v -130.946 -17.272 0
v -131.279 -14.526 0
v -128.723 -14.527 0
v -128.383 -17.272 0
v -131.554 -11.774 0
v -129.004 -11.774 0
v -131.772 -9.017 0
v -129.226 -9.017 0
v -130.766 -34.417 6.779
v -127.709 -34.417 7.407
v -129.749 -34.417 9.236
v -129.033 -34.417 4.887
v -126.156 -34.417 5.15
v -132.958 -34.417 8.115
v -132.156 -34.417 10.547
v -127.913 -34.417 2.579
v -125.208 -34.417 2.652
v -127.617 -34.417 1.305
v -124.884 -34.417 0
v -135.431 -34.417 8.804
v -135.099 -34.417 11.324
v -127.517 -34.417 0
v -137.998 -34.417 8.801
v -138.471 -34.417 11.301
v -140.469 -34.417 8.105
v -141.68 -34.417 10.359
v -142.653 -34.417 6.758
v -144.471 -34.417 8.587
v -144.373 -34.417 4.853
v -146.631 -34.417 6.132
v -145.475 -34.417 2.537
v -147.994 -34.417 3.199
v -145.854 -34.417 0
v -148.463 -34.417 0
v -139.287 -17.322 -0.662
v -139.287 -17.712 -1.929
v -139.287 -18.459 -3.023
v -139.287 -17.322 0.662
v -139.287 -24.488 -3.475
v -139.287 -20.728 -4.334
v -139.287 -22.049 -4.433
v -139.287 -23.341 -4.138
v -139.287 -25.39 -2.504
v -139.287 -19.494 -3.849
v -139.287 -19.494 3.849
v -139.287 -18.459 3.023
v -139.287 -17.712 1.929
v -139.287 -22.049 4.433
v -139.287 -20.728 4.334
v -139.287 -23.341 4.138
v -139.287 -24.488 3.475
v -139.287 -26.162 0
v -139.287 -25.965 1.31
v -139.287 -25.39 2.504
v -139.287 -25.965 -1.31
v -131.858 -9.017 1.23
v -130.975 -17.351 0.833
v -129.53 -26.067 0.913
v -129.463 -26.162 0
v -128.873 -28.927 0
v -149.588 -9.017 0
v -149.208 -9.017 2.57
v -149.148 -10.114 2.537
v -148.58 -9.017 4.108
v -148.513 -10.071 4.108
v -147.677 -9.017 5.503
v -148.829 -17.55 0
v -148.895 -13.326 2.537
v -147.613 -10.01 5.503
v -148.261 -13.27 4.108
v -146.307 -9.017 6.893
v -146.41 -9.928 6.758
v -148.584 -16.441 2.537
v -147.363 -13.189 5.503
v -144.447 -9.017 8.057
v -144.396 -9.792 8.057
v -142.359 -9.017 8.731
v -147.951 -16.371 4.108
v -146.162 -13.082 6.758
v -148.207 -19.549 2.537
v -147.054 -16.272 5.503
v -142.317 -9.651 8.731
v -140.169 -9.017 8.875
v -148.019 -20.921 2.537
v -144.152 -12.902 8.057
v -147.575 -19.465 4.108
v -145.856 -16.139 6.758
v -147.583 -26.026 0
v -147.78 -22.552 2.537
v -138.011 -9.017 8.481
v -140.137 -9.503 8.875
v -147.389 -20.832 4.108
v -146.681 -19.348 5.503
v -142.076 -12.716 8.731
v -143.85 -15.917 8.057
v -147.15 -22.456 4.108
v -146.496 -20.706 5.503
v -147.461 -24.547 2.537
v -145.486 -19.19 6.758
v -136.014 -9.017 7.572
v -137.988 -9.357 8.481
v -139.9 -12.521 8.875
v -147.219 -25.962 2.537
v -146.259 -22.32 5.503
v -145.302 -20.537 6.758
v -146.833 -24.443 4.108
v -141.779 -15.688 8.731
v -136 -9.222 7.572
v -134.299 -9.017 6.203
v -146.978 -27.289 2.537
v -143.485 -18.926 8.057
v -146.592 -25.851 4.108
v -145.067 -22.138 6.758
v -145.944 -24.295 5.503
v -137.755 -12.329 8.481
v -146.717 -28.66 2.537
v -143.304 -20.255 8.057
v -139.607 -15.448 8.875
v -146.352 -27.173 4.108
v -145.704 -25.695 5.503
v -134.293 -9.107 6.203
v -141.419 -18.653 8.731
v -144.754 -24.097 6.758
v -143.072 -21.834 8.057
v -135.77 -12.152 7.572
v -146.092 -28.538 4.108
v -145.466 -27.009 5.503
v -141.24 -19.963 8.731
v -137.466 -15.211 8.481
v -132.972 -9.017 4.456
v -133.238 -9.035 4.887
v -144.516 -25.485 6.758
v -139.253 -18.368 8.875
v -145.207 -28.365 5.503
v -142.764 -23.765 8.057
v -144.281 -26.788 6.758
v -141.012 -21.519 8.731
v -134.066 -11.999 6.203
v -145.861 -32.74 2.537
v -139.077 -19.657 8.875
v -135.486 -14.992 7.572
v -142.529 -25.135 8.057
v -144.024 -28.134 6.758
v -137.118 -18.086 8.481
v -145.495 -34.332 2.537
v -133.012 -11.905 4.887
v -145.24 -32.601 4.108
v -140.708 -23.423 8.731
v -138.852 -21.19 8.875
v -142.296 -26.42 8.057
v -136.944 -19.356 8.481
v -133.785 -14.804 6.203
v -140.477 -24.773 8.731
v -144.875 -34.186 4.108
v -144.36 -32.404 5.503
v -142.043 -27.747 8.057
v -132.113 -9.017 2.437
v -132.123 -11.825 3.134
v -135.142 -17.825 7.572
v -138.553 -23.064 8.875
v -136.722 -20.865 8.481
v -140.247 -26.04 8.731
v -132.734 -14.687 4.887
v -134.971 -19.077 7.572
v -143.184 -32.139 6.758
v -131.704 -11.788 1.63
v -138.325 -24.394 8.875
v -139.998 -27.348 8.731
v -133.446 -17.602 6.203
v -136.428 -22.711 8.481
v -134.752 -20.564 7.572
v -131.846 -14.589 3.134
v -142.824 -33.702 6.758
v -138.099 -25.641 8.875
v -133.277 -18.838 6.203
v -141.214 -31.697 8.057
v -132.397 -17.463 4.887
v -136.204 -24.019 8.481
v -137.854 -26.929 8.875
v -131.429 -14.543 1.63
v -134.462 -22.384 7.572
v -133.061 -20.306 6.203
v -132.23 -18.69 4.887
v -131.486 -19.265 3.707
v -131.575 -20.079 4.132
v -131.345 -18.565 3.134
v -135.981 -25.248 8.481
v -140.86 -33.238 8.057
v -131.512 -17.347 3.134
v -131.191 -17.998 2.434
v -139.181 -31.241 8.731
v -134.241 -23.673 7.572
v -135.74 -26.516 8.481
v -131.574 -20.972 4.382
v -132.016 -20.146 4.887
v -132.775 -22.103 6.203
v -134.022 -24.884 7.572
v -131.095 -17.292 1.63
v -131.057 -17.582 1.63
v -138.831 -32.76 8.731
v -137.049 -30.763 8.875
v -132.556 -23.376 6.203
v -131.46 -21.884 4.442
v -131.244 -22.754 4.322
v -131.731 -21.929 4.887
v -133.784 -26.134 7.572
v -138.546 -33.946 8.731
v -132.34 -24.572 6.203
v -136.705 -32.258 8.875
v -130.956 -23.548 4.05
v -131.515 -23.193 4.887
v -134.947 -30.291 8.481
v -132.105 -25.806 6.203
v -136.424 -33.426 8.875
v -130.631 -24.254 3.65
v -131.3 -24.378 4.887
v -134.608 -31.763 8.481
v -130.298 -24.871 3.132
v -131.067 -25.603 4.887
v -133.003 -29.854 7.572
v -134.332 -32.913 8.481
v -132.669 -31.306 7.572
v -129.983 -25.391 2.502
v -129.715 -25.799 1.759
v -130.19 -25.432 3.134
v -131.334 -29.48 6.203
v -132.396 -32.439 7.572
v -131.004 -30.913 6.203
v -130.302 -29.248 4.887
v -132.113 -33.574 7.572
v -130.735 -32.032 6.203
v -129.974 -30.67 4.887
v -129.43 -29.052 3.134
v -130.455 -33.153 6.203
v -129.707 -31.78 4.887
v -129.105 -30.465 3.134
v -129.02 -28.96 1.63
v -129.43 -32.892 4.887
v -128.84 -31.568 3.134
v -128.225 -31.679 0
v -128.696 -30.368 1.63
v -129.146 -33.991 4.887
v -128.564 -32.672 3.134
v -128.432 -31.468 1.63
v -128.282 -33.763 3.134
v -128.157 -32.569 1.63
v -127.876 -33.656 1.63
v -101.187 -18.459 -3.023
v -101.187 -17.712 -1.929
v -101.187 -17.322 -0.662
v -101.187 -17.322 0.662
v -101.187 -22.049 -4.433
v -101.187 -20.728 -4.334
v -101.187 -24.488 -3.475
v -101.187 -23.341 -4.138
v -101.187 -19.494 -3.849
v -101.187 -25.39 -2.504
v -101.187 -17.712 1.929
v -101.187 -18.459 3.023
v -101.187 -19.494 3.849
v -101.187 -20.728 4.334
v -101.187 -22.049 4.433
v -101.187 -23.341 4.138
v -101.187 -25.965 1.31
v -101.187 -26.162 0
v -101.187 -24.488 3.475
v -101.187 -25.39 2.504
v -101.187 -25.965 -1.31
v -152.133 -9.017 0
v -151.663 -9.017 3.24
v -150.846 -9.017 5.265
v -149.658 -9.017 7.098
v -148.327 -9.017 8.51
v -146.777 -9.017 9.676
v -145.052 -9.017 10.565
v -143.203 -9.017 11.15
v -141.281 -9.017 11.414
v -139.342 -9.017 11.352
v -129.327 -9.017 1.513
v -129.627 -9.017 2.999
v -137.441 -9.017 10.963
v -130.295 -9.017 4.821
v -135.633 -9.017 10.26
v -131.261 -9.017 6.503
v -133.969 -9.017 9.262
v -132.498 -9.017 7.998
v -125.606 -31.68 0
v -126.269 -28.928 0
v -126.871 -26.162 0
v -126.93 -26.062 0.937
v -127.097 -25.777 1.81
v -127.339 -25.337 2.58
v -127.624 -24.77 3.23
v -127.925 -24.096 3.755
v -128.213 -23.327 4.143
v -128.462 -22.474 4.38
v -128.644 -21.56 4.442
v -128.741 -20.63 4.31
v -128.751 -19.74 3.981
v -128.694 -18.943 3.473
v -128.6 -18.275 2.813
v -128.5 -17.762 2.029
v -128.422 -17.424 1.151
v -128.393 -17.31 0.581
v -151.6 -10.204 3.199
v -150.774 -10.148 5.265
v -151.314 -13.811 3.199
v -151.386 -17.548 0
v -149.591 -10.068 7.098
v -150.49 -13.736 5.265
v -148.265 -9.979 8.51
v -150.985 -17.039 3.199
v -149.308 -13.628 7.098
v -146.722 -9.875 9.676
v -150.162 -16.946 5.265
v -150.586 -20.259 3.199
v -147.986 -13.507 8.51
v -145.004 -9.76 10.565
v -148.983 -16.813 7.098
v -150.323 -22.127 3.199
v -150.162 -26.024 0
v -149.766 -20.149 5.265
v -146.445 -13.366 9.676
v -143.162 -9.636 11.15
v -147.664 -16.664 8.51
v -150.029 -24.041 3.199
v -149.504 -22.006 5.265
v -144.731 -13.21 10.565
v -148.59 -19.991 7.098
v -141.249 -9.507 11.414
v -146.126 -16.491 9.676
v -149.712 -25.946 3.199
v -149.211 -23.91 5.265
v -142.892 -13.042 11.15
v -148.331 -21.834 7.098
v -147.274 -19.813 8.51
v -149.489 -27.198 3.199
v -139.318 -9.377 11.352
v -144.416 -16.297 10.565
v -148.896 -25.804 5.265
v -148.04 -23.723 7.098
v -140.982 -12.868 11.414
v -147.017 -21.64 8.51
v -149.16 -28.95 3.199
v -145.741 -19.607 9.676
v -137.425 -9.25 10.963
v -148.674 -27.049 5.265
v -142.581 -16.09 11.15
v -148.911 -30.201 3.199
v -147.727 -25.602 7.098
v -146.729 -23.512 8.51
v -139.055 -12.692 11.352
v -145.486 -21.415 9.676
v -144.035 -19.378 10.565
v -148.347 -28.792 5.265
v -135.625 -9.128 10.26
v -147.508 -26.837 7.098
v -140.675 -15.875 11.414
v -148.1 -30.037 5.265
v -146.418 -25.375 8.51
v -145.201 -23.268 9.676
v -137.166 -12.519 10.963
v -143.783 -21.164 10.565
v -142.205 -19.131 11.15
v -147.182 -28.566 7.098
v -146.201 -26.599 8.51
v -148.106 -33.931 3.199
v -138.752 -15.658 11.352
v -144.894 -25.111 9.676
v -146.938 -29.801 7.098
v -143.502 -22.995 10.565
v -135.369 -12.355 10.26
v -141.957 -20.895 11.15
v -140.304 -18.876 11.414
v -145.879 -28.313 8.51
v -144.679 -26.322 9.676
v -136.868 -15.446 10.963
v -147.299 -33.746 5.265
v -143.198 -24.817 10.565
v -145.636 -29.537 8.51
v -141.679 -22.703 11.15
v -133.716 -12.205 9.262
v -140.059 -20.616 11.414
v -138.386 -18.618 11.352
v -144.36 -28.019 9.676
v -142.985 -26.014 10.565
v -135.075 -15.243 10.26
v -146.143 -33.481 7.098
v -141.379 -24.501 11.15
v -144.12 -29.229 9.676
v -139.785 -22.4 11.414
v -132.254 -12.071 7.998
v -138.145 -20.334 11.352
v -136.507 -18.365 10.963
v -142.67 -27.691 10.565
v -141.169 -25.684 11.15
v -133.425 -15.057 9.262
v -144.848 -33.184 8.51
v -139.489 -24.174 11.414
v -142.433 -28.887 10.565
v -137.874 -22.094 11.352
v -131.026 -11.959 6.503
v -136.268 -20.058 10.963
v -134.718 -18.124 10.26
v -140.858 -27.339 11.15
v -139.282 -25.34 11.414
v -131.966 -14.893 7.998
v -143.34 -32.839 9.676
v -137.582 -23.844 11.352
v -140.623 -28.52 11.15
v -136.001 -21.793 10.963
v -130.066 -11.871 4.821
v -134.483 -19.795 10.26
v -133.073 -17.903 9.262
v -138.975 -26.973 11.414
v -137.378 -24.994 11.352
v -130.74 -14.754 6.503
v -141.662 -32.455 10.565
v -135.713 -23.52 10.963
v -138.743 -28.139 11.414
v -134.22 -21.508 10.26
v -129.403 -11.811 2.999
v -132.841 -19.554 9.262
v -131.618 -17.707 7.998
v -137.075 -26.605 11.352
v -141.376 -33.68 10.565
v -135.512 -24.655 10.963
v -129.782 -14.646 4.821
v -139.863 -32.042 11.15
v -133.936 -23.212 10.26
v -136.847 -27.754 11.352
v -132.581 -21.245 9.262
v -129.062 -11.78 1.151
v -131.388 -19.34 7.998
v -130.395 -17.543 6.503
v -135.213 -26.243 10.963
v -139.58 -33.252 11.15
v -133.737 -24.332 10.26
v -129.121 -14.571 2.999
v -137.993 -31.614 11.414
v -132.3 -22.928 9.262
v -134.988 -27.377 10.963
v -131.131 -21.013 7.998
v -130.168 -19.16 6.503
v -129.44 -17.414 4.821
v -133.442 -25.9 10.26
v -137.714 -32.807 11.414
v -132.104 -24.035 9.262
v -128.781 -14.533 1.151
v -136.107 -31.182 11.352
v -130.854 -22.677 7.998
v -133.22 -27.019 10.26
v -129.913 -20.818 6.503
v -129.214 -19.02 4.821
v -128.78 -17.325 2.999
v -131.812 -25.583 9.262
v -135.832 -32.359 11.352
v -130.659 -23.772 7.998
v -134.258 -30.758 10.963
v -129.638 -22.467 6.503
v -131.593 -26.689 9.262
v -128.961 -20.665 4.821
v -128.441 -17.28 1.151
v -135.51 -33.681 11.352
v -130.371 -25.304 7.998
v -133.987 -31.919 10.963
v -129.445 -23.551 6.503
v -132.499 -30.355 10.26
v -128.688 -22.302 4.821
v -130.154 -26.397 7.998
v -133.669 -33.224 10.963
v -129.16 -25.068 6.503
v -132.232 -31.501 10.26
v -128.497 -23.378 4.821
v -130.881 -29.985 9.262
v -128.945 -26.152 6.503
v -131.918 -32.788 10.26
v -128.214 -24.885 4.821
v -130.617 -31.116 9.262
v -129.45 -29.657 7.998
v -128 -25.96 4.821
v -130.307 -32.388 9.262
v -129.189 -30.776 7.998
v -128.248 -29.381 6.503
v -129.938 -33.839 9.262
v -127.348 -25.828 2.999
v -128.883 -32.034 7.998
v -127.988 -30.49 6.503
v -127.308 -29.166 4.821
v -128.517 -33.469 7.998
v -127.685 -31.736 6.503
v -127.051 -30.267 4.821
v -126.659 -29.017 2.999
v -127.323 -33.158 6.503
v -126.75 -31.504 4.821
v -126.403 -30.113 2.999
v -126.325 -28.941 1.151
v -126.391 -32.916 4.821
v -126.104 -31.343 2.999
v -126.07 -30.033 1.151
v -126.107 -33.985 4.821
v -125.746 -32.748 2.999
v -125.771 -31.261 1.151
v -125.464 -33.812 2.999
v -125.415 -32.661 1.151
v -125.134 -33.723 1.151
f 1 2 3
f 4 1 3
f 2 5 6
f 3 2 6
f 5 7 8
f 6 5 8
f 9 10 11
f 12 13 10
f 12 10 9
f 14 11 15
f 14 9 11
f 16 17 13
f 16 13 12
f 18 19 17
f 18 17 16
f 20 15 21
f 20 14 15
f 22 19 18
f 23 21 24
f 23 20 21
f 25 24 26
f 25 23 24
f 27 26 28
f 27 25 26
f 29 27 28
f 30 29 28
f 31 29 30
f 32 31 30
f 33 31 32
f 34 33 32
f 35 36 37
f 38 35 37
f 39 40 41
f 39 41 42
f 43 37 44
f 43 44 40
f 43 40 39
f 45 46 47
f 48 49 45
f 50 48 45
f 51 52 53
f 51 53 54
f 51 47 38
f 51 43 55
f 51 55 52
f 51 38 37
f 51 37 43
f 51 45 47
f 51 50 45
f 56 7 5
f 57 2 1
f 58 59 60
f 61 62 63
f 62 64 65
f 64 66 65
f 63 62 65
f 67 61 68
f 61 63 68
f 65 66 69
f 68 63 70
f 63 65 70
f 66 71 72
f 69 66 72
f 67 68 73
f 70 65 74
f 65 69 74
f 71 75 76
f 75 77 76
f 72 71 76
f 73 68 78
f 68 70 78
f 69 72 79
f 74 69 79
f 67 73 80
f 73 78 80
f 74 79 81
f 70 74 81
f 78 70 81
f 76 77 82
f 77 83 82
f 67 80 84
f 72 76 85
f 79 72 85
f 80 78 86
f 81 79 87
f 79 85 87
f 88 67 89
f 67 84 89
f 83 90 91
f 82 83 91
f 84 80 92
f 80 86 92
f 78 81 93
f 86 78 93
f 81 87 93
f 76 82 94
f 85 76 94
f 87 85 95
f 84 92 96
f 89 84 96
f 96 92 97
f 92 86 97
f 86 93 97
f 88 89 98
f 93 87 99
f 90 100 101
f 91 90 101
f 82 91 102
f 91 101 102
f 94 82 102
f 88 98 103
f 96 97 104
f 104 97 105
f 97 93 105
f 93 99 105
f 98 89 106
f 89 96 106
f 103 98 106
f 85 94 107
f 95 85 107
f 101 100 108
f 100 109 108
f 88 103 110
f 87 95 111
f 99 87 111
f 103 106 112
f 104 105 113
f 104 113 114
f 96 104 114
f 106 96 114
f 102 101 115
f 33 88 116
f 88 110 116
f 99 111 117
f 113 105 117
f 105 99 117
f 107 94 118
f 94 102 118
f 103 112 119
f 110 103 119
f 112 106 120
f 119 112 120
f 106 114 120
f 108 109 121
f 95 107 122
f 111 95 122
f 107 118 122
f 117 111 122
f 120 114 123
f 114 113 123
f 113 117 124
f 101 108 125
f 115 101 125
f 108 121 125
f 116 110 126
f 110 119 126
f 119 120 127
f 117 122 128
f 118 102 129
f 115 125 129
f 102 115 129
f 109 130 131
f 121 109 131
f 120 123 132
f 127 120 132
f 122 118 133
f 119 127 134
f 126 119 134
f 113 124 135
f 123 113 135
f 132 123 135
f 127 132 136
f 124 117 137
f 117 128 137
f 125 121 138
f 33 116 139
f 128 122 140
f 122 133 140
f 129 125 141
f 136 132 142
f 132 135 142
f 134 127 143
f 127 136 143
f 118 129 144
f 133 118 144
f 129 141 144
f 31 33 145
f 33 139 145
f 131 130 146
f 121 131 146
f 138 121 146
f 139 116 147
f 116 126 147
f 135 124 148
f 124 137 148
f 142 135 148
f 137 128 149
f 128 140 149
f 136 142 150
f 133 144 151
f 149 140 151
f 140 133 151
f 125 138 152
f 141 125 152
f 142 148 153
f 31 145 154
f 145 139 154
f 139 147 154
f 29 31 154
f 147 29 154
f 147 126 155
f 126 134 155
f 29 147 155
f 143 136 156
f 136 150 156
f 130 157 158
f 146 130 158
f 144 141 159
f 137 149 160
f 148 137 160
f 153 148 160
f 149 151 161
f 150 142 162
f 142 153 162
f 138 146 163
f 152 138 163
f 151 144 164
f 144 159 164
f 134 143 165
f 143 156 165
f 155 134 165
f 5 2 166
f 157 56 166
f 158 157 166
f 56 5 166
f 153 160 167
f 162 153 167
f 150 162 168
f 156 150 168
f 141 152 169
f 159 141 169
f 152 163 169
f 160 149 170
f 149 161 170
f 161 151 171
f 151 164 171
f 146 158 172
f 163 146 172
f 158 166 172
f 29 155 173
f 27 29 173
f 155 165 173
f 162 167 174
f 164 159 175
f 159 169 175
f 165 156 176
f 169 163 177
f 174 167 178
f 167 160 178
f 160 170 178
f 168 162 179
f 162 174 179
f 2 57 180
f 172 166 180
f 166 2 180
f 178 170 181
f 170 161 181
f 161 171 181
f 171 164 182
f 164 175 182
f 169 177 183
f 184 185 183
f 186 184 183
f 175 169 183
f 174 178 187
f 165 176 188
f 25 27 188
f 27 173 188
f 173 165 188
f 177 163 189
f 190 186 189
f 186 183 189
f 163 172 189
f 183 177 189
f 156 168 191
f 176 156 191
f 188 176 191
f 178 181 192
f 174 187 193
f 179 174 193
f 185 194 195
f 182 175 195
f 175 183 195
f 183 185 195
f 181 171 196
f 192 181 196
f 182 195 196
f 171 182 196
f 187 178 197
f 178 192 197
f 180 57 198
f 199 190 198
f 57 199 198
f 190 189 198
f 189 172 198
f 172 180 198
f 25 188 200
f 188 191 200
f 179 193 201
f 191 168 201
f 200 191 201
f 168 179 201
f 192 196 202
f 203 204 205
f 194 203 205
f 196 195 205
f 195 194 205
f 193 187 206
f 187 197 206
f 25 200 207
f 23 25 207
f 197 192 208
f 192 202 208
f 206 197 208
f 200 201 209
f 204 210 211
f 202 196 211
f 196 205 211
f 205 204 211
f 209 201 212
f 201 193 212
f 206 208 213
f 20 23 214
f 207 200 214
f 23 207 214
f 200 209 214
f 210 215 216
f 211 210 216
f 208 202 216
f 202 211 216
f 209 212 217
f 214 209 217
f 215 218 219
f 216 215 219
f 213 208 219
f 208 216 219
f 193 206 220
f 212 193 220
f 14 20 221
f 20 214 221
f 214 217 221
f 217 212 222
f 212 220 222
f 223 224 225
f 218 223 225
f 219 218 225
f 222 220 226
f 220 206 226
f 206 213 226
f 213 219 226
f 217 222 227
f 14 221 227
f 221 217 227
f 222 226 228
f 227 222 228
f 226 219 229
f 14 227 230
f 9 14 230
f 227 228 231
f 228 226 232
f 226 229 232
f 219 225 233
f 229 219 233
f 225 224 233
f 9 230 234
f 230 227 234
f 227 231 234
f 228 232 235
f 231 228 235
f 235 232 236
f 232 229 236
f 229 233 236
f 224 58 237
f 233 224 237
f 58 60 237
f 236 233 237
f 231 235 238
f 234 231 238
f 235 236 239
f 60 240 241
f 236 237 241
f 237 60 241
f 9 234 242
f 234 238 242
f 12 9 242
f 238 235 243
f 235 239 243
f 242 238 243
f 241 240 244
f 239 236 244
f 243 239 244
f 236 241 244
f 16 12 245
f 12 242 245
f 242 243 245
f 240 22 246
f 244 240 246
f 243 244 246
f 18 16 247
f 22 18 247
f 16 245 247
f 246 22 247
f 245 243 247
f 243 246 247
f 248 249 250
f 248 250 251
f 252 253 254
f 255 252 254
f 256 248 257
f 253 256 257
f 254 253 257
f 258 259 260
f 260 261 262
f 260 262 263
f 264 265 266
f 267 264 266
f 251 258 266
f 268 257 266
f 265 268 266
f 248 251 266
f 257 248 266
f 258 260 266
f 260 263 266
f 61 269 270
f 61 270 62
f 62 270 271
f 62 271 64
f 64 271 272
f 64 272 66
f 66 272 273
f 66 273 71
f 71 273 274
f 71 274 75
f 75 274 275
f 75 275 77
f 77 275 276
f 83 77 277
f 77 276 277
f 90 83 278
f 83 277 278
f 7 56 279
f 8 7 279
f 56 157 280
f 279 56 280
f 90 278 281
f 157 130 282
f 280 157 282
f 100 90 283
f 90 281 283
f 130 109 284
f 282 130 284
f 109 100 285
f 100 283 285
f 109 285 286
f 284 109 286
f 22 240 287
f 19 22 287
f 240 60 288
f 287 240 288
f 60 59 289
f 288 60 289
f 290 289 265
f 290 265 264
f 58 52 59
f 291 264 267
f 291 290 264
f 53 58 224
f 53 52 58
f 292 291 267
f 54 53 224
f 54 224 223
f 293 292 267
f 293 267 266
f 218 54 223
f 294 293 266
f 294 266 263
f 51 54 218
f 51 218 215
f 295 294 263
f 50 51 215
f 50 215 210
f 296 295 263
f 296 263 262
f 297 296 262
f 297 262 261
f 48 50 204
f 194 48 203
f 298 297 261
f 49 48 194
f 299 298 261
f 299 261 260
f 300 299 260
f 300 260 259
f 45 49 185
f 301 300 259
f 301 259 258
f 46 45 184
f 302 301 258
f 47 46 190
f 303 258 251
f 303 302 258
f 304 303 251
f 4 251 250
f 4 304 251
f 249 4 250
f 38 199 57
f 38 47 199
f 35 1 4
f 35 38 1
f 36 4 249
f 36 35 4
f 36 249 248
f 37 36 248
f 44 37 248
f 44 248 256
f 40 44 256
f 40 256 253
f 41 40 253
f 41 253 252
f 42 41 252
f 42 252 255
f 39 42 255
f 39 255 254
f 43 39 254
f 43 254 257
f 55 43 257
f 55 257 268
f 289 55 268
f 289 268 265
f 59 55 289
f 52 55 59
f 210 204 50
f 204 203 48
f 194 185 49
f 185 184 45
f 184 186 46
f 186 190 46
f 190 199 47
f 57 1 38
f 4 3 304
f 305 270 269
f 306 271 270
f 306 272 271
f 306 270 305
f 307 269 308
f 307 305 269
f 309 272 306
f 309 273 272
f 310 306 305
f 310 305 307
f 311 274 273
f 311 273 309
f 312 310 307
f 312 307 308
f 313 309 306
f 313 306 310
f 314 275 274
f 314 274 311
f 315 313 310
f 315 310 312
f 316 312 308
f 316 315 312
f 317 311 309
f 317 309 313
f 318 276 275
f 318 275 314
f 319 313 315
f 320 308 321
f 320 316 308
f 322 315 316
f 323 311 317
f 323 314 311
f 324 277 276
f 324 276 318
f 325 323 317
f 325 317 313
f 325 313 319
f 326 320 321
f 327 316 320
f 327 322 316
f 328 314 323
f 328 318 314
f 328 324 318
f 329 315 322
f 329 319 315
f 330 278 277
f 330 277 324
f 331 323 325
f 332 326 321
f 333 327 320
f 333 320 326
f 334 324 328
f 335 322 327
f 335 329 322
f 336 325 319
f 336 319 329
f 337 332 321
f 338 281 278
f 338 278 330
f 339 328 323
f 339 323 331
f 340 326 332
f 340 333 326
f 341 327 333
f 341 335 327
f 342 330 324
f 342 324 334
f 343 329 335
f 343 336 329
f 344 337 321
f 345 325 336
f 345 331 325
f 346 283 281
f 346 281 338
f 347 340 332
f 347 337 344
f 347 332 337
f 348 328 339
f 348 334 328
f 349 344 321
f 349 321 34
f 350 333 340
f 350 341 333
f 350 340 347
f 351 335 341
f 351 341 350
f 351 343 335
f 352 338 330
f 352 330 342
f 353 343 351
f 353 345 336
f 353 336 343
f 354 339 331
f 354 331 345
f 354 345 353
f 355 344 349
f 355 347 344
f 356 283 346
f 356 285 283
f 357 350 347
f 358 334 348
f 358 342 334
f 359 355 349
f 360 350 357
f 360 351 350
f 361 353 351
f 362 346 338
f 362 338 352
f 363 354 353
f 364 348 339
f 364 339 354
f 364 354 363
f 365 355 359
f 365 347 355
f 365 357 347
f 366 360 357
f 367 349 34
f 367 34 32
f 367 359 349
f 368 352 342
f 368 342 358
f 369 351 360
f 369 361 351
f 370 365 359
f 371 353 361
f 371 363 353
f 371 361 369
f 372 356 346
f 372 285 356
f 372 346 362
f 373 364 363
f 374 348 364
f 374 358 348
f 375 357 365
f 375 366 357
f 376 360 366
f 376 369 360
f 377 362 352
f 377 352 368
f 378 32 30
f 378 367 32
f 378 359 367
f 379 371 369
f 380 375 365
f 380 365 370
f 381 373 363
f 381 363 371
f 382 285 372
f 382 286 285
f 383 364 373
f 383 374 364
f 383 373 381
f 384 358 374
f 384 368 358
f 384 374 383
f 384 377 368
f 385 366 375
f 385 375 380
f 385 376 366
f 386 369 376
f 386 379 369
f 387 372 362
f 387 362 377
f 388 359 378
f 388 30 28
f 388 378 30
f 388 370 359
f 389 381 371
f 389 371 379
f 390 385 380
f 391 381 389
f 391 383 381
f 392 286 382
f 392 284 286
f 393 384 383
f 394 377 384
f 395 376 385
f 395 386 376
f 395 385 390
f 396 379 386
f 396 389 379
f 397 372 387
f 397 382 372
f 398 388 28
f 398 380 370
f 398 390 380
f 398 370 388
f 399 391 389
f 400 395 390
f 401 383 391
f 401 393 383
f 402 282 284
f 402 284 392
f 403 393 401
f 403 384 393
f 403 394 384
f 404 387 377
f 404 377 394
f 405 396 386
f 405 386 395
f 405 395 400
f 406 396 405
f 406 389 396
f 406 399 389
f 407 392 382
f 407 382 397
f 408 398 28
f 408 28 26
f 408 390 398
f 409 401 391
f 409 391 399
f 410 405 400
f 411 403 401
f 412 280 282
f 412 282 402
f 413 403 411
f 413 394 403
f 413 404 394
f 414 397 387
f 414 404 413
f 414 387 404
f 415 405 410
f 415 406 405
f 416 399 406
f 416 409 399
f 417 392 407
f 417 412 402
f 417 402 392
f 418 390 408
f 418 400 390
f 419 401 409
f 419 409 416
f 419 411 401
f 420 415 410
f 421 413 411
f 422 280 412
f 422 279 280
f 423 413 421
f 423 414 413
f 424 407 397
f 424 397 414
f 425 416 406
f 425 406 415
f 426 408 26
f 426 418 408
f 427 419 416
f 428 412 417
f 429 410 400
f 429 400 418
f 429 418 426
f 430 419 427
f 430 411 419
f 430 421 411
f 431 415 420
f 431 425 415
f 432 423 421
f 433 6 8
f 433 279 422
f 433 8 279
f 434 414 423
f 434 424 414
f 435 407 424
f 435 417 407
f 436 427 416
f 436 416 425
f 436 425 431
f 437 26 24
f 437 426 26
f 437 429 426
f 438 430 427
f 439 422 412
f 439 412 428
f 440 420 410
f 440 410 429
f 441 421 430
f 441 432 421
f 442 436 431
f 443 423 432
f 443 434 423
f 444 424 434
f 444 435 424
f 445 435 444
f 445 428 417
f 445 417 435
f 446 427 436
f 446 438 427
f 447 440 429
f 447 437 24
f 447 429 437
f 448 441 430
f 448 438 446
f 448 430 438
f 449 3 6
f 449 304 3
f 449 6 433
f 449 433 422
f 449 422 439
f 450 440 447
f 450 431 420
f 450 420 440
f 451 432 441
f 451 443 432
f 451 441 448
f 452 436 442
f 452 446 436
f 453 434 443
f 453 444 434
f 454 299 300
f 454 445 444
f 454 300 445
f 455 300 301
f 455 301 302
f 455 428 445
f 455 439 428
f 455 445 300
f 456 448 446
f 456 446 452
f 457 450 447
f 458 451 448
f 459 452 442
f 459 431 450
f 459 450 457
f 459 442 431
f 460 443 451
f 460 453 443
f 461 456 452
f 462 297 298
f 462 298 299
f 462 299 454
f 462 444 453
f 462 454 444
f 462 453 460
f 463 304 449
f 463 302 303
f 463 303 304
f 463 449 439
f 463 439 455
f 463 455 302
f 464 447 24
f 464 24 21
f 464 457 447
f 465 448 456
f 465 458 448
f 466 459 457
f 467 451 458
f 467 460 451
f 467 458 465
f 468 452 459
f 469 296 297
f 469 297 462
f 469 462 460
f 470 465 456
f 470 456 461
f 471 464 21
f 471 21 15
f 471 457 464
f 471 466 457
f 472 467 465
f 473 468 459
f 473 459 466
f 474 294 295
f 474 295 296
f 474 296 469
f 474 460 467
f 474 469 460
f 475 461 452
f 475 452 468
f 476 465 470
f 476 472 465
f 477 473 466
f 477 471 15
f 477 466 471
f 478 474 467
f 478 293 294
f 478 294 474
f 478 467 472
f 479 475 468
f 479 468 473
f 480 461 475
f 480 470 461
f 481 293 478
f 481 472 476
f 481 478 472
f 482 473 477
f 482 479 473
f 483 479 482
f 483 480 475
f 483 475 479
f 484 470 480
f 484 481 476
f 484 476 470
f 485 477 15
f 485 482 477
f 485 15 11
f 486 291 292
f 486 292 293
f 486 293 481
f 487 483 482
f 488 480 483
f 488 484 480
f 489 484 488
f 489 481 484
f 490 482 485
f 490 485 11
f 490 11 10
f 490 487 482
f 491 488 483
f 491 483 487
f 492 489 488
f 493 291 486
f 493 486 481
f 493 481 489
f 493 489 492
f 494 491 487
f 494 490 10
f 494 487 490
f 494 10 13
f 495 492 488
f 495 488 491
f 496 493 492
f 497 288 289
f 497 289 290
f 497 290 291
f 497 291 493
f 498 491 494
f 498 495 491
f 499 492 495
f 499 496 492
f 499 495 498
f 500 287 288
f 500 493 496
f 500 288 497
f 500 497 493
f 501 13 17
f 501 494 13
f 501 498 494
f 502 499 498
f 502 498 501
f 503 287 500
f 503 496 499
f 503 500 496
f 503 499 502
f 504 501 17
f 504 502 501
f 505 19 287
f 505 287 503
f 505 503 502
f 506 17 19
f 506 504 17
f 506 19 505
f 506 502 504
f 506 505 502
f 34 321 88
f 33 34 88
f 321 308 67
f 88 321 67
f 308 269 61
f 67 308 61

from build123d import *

# Parameters (mm, degrees)
F2_R          = 11.43
F2_R_2        = 8.89
F0_W          = 177.8
F0_H          = 5.7147379888
F4_DEPTH      = 25.4
F4_DEPTH_BACK = 25.4
F5_DEPTH      = 25.4
F7_R          = 4.445
F8_DEPTH      = 38.1


with BuildPart() as f3:
    # F3: sweep along a path in F0
    with BuildLine(Plane.XY) as f3_path:
        ThreePointArc((140.97, 0), (-140.9612054829, 1.5746265624), (140.9348230289, -3.1490566563))
        ThreePointArc((140.9348230289, -3.1490566563), (140.9612054829, -1.5746265624), (140.97, 0))
    # F2 (on line) → F3 (sweep)
    with BuildSketch(Plane(origin=(0, 0, 0), x_dir=(-1, 0, 0), z_dir=(0, 1, 0))):
        with Locations((-140.97, 0)):
            Circle(F2_R)
        with Locations((-140.97, 0)):
            Circle(F2_R_2, mode=Mode.SUBTRACT)
    sweep(path=f3_path.line)

    # F0 (on Top) → F4 (cut, two sides)
    with BuildSketch(Plane.XY) as f4_sk:
        with BuildLine():
            ThreePointArc((-140.6813228933, -9.017), (-4.5108098905, 140.8978122404), (140.97, 0))
            ThreePointArc((140.97, 0), (140.9612054829, -1.5746265624), (140.9348230289, -3.1490566563))
            ThreePointArc((140.9348230289, -3.1490566563), (15.7764325547, -140.0844212461), (-136.7041001982, -34.417))
            Line((-136.7041001982, -34.417), (-181.8818151951, -34.417))
            Line((-181.8818151951, -34.417), (-181.8818151951, -162.2846722603))
            Line((-181.8818151951, -162.2846722603), (186.068713665, -162.2846722603))
            Line((186.068713665, -162.2846722603), (186.068713665, 166.5027737617))
            Line((186.068713665, 166.5027737617), (-181.8818151951, 166.5027737617))
            Line((-181.8818151951, 166.5027737617), (-181.8818151951, -9.017))
            Line((-181.8818151951, -9.017), (-140.6813228933, -9.017))
        make_face()
        with BuildLine():
            ThreePointArc((-127.517044002, -34.417), (17.359078723, -130.9342918639), (132.08, 0))
            Line((132.08, 0), (94.4372, 0))
            Line((94.4372, 0), (94.4372, -16.0022620112))
            Line((94.4372, -16.0022620112), (94.4372, -21.717))
            Line((94.4372, -21.717), (-83.3628, -21.717))
            Line((-83.3628, -21.717), (-83.3628, -34.417))
            Line((-83.3628, -34.417), (-127.517044002, -34.417))
        make_face()
        with BuildLine():
            Line((94.4372, 0), (132.08, 0))
            ThreePointArc((132.08, 0), (-4.5111319594, 132.0029396962), (-131.7718487045, -9.017))
            Line((-131.7718487045, -9.017), (-83.3628, -9.017))
            Line((-83.3628, -9.017), (-83.3628, -16.0022620112))
            Line((-83.3628, -16.0022620112), (94.4372, -16.0022620112))
            Line((94.4372, -16.0022620112), (94.4372, 0))
        make_face()
        with Locations((5.5372, -18.8596310056)):
            Rectangle(F0_W, F0_H)
        with BuildLine():
            Line((140.97, 0), (132.08, 0))
            ThreePointArc((132.08, 0), (17.359078723, -130.9342918639), (-127.517044002, -34.417))
            Line((-127.517044002, -34.417), (-136.7041001982, -34.417))
            ThreePointArc((-136.7041001982, -34.417), (15.7764325547, -140.0844212461), (140.9348230289, -3.1490566563))
            ThreePointArc((140.9348230289, -3.1490566563), (140.9612054829, -1.5746265624), (140.97, 0))
        make_face()
        with BuildLine():
            ThreePointArc((-131.7718487045, -9.017), (-4.5111319594, 132.0029396962), (132.08, 0))
            Line((132.08, 0), (140.97, 0))
            ThreePointArc((140.97, 0), (-4.5108098905, 140.8978122404), (-140.6813228933, -9.017))
            Line((-140.6813228933, -9.017), (-131.7718487045, -9.017))
        make_face()
    extrude(amount=F4_DEPTH, mode=Mode.SUBTRACT)
    extrude(f4_sk.sketch, amount=-F4_DEPTH_BACK, mode=Mode.SUBTRACT)

    # F0 (on Top) → F5 (cut)
    with BuildSketch(Plane.XY):
        with BuildLine():
            ThreePointArc((-139.2871595338, -21.717), (-140.1281923388, -15.3828024712), (-140.6813228933, -9.017))
            Line((-140.6813228933, -9.017), (-181.8818151951, -9.017))
            Line((-181.8818151951, -9.017), (-198.6888721585, -9.017))
            Line((-198.6888721585, -9.017), (-198.6888721585, -34.417))
            Line((-198.6888721585, -34.417), (-181.8818151951, -34.417))
            Line((-181.8818151951, -34.417), (-136.7041001982, -34.417))
            ThreePointArc((-136.7041001982, -34.417), (-138.1416532481, -28.0966997685), (-139.2871595338, -21.717))
        make_face()
        with BuildLine():
            Line((-83.3628, -9.017), (-131.7718487045, -9.017))
            ThreePointArc((-131.7718487045, -9.017), (-131.1808944972, -15.385035551), (-130.282379127, -21.717))
            Line((-130.282379127, -21.717), (-83.3628, -21.717))
            Line((-83.3628, -21.717), (-83.3628, -16.0022620112))
            Line((-83.3628, -16.0022620112), (-83.3628, -9.017))
        make_face()
        with BuildLine():
            ThreePointArc((-130.282379127, -21.717), (-129.056027141, -28.1010366106), (-127.517044002, -34.417))
            Line((-127.517044002, -34.417), (-83.3628, -34.417))
            Line((-83.3628, -34.417), (-83.3628, -21.717))
            Line((-83.3628, -21.717), (-130.282379127, -21.717))
        make_face()
        with BuildLine():
            Line((-136.7041001982, -34.417), (-127.517044002, -34.417))
            ThreePointArc((-127.517044002, -34.417), (-129.056027141, -28.1010366106), (-130.282379127, -21.717))
            Line((-130.282379127, -21.717), (-139.2871595338, -21.717))
            ThreePointArc((-139.2871595338, -21.717), (-138.1416532481, -28.0966997685), (-136.7041001982, -34.417))
        make_face()
        with BuildLine():
            ThreePointArc((-130.282379127, -21.717), (-131.1808944972, -15.385035551), (-131.7718487045, -9.017))
            Line((-131.7718487045, -9.017), (-140.6813228933, -9.017))
            ThreePointArc((-140.6813228933, -9.017), (-140.1281923388, -15.3828024712), (-139.2871595338, -21.717))
            Line((-139.2871595338, -21.717), (-130.282379127, -21.717))
        make_face()
    extrude(amount=-F5_DEPTH, mode=Mode.SUBTRACT)

    # F7 (on line) → F8 (join)
    with BuildSketch(Plane(origin=(-139.2871595338, 0, 0), x_dir=(0, -1, 0), z_dir=(-1, 0, 0))):
        with Locations((21.717, 0)):
            Circle(F7_R)
    extrude(amount=-F8_DEPTH)


solid = f3.part
